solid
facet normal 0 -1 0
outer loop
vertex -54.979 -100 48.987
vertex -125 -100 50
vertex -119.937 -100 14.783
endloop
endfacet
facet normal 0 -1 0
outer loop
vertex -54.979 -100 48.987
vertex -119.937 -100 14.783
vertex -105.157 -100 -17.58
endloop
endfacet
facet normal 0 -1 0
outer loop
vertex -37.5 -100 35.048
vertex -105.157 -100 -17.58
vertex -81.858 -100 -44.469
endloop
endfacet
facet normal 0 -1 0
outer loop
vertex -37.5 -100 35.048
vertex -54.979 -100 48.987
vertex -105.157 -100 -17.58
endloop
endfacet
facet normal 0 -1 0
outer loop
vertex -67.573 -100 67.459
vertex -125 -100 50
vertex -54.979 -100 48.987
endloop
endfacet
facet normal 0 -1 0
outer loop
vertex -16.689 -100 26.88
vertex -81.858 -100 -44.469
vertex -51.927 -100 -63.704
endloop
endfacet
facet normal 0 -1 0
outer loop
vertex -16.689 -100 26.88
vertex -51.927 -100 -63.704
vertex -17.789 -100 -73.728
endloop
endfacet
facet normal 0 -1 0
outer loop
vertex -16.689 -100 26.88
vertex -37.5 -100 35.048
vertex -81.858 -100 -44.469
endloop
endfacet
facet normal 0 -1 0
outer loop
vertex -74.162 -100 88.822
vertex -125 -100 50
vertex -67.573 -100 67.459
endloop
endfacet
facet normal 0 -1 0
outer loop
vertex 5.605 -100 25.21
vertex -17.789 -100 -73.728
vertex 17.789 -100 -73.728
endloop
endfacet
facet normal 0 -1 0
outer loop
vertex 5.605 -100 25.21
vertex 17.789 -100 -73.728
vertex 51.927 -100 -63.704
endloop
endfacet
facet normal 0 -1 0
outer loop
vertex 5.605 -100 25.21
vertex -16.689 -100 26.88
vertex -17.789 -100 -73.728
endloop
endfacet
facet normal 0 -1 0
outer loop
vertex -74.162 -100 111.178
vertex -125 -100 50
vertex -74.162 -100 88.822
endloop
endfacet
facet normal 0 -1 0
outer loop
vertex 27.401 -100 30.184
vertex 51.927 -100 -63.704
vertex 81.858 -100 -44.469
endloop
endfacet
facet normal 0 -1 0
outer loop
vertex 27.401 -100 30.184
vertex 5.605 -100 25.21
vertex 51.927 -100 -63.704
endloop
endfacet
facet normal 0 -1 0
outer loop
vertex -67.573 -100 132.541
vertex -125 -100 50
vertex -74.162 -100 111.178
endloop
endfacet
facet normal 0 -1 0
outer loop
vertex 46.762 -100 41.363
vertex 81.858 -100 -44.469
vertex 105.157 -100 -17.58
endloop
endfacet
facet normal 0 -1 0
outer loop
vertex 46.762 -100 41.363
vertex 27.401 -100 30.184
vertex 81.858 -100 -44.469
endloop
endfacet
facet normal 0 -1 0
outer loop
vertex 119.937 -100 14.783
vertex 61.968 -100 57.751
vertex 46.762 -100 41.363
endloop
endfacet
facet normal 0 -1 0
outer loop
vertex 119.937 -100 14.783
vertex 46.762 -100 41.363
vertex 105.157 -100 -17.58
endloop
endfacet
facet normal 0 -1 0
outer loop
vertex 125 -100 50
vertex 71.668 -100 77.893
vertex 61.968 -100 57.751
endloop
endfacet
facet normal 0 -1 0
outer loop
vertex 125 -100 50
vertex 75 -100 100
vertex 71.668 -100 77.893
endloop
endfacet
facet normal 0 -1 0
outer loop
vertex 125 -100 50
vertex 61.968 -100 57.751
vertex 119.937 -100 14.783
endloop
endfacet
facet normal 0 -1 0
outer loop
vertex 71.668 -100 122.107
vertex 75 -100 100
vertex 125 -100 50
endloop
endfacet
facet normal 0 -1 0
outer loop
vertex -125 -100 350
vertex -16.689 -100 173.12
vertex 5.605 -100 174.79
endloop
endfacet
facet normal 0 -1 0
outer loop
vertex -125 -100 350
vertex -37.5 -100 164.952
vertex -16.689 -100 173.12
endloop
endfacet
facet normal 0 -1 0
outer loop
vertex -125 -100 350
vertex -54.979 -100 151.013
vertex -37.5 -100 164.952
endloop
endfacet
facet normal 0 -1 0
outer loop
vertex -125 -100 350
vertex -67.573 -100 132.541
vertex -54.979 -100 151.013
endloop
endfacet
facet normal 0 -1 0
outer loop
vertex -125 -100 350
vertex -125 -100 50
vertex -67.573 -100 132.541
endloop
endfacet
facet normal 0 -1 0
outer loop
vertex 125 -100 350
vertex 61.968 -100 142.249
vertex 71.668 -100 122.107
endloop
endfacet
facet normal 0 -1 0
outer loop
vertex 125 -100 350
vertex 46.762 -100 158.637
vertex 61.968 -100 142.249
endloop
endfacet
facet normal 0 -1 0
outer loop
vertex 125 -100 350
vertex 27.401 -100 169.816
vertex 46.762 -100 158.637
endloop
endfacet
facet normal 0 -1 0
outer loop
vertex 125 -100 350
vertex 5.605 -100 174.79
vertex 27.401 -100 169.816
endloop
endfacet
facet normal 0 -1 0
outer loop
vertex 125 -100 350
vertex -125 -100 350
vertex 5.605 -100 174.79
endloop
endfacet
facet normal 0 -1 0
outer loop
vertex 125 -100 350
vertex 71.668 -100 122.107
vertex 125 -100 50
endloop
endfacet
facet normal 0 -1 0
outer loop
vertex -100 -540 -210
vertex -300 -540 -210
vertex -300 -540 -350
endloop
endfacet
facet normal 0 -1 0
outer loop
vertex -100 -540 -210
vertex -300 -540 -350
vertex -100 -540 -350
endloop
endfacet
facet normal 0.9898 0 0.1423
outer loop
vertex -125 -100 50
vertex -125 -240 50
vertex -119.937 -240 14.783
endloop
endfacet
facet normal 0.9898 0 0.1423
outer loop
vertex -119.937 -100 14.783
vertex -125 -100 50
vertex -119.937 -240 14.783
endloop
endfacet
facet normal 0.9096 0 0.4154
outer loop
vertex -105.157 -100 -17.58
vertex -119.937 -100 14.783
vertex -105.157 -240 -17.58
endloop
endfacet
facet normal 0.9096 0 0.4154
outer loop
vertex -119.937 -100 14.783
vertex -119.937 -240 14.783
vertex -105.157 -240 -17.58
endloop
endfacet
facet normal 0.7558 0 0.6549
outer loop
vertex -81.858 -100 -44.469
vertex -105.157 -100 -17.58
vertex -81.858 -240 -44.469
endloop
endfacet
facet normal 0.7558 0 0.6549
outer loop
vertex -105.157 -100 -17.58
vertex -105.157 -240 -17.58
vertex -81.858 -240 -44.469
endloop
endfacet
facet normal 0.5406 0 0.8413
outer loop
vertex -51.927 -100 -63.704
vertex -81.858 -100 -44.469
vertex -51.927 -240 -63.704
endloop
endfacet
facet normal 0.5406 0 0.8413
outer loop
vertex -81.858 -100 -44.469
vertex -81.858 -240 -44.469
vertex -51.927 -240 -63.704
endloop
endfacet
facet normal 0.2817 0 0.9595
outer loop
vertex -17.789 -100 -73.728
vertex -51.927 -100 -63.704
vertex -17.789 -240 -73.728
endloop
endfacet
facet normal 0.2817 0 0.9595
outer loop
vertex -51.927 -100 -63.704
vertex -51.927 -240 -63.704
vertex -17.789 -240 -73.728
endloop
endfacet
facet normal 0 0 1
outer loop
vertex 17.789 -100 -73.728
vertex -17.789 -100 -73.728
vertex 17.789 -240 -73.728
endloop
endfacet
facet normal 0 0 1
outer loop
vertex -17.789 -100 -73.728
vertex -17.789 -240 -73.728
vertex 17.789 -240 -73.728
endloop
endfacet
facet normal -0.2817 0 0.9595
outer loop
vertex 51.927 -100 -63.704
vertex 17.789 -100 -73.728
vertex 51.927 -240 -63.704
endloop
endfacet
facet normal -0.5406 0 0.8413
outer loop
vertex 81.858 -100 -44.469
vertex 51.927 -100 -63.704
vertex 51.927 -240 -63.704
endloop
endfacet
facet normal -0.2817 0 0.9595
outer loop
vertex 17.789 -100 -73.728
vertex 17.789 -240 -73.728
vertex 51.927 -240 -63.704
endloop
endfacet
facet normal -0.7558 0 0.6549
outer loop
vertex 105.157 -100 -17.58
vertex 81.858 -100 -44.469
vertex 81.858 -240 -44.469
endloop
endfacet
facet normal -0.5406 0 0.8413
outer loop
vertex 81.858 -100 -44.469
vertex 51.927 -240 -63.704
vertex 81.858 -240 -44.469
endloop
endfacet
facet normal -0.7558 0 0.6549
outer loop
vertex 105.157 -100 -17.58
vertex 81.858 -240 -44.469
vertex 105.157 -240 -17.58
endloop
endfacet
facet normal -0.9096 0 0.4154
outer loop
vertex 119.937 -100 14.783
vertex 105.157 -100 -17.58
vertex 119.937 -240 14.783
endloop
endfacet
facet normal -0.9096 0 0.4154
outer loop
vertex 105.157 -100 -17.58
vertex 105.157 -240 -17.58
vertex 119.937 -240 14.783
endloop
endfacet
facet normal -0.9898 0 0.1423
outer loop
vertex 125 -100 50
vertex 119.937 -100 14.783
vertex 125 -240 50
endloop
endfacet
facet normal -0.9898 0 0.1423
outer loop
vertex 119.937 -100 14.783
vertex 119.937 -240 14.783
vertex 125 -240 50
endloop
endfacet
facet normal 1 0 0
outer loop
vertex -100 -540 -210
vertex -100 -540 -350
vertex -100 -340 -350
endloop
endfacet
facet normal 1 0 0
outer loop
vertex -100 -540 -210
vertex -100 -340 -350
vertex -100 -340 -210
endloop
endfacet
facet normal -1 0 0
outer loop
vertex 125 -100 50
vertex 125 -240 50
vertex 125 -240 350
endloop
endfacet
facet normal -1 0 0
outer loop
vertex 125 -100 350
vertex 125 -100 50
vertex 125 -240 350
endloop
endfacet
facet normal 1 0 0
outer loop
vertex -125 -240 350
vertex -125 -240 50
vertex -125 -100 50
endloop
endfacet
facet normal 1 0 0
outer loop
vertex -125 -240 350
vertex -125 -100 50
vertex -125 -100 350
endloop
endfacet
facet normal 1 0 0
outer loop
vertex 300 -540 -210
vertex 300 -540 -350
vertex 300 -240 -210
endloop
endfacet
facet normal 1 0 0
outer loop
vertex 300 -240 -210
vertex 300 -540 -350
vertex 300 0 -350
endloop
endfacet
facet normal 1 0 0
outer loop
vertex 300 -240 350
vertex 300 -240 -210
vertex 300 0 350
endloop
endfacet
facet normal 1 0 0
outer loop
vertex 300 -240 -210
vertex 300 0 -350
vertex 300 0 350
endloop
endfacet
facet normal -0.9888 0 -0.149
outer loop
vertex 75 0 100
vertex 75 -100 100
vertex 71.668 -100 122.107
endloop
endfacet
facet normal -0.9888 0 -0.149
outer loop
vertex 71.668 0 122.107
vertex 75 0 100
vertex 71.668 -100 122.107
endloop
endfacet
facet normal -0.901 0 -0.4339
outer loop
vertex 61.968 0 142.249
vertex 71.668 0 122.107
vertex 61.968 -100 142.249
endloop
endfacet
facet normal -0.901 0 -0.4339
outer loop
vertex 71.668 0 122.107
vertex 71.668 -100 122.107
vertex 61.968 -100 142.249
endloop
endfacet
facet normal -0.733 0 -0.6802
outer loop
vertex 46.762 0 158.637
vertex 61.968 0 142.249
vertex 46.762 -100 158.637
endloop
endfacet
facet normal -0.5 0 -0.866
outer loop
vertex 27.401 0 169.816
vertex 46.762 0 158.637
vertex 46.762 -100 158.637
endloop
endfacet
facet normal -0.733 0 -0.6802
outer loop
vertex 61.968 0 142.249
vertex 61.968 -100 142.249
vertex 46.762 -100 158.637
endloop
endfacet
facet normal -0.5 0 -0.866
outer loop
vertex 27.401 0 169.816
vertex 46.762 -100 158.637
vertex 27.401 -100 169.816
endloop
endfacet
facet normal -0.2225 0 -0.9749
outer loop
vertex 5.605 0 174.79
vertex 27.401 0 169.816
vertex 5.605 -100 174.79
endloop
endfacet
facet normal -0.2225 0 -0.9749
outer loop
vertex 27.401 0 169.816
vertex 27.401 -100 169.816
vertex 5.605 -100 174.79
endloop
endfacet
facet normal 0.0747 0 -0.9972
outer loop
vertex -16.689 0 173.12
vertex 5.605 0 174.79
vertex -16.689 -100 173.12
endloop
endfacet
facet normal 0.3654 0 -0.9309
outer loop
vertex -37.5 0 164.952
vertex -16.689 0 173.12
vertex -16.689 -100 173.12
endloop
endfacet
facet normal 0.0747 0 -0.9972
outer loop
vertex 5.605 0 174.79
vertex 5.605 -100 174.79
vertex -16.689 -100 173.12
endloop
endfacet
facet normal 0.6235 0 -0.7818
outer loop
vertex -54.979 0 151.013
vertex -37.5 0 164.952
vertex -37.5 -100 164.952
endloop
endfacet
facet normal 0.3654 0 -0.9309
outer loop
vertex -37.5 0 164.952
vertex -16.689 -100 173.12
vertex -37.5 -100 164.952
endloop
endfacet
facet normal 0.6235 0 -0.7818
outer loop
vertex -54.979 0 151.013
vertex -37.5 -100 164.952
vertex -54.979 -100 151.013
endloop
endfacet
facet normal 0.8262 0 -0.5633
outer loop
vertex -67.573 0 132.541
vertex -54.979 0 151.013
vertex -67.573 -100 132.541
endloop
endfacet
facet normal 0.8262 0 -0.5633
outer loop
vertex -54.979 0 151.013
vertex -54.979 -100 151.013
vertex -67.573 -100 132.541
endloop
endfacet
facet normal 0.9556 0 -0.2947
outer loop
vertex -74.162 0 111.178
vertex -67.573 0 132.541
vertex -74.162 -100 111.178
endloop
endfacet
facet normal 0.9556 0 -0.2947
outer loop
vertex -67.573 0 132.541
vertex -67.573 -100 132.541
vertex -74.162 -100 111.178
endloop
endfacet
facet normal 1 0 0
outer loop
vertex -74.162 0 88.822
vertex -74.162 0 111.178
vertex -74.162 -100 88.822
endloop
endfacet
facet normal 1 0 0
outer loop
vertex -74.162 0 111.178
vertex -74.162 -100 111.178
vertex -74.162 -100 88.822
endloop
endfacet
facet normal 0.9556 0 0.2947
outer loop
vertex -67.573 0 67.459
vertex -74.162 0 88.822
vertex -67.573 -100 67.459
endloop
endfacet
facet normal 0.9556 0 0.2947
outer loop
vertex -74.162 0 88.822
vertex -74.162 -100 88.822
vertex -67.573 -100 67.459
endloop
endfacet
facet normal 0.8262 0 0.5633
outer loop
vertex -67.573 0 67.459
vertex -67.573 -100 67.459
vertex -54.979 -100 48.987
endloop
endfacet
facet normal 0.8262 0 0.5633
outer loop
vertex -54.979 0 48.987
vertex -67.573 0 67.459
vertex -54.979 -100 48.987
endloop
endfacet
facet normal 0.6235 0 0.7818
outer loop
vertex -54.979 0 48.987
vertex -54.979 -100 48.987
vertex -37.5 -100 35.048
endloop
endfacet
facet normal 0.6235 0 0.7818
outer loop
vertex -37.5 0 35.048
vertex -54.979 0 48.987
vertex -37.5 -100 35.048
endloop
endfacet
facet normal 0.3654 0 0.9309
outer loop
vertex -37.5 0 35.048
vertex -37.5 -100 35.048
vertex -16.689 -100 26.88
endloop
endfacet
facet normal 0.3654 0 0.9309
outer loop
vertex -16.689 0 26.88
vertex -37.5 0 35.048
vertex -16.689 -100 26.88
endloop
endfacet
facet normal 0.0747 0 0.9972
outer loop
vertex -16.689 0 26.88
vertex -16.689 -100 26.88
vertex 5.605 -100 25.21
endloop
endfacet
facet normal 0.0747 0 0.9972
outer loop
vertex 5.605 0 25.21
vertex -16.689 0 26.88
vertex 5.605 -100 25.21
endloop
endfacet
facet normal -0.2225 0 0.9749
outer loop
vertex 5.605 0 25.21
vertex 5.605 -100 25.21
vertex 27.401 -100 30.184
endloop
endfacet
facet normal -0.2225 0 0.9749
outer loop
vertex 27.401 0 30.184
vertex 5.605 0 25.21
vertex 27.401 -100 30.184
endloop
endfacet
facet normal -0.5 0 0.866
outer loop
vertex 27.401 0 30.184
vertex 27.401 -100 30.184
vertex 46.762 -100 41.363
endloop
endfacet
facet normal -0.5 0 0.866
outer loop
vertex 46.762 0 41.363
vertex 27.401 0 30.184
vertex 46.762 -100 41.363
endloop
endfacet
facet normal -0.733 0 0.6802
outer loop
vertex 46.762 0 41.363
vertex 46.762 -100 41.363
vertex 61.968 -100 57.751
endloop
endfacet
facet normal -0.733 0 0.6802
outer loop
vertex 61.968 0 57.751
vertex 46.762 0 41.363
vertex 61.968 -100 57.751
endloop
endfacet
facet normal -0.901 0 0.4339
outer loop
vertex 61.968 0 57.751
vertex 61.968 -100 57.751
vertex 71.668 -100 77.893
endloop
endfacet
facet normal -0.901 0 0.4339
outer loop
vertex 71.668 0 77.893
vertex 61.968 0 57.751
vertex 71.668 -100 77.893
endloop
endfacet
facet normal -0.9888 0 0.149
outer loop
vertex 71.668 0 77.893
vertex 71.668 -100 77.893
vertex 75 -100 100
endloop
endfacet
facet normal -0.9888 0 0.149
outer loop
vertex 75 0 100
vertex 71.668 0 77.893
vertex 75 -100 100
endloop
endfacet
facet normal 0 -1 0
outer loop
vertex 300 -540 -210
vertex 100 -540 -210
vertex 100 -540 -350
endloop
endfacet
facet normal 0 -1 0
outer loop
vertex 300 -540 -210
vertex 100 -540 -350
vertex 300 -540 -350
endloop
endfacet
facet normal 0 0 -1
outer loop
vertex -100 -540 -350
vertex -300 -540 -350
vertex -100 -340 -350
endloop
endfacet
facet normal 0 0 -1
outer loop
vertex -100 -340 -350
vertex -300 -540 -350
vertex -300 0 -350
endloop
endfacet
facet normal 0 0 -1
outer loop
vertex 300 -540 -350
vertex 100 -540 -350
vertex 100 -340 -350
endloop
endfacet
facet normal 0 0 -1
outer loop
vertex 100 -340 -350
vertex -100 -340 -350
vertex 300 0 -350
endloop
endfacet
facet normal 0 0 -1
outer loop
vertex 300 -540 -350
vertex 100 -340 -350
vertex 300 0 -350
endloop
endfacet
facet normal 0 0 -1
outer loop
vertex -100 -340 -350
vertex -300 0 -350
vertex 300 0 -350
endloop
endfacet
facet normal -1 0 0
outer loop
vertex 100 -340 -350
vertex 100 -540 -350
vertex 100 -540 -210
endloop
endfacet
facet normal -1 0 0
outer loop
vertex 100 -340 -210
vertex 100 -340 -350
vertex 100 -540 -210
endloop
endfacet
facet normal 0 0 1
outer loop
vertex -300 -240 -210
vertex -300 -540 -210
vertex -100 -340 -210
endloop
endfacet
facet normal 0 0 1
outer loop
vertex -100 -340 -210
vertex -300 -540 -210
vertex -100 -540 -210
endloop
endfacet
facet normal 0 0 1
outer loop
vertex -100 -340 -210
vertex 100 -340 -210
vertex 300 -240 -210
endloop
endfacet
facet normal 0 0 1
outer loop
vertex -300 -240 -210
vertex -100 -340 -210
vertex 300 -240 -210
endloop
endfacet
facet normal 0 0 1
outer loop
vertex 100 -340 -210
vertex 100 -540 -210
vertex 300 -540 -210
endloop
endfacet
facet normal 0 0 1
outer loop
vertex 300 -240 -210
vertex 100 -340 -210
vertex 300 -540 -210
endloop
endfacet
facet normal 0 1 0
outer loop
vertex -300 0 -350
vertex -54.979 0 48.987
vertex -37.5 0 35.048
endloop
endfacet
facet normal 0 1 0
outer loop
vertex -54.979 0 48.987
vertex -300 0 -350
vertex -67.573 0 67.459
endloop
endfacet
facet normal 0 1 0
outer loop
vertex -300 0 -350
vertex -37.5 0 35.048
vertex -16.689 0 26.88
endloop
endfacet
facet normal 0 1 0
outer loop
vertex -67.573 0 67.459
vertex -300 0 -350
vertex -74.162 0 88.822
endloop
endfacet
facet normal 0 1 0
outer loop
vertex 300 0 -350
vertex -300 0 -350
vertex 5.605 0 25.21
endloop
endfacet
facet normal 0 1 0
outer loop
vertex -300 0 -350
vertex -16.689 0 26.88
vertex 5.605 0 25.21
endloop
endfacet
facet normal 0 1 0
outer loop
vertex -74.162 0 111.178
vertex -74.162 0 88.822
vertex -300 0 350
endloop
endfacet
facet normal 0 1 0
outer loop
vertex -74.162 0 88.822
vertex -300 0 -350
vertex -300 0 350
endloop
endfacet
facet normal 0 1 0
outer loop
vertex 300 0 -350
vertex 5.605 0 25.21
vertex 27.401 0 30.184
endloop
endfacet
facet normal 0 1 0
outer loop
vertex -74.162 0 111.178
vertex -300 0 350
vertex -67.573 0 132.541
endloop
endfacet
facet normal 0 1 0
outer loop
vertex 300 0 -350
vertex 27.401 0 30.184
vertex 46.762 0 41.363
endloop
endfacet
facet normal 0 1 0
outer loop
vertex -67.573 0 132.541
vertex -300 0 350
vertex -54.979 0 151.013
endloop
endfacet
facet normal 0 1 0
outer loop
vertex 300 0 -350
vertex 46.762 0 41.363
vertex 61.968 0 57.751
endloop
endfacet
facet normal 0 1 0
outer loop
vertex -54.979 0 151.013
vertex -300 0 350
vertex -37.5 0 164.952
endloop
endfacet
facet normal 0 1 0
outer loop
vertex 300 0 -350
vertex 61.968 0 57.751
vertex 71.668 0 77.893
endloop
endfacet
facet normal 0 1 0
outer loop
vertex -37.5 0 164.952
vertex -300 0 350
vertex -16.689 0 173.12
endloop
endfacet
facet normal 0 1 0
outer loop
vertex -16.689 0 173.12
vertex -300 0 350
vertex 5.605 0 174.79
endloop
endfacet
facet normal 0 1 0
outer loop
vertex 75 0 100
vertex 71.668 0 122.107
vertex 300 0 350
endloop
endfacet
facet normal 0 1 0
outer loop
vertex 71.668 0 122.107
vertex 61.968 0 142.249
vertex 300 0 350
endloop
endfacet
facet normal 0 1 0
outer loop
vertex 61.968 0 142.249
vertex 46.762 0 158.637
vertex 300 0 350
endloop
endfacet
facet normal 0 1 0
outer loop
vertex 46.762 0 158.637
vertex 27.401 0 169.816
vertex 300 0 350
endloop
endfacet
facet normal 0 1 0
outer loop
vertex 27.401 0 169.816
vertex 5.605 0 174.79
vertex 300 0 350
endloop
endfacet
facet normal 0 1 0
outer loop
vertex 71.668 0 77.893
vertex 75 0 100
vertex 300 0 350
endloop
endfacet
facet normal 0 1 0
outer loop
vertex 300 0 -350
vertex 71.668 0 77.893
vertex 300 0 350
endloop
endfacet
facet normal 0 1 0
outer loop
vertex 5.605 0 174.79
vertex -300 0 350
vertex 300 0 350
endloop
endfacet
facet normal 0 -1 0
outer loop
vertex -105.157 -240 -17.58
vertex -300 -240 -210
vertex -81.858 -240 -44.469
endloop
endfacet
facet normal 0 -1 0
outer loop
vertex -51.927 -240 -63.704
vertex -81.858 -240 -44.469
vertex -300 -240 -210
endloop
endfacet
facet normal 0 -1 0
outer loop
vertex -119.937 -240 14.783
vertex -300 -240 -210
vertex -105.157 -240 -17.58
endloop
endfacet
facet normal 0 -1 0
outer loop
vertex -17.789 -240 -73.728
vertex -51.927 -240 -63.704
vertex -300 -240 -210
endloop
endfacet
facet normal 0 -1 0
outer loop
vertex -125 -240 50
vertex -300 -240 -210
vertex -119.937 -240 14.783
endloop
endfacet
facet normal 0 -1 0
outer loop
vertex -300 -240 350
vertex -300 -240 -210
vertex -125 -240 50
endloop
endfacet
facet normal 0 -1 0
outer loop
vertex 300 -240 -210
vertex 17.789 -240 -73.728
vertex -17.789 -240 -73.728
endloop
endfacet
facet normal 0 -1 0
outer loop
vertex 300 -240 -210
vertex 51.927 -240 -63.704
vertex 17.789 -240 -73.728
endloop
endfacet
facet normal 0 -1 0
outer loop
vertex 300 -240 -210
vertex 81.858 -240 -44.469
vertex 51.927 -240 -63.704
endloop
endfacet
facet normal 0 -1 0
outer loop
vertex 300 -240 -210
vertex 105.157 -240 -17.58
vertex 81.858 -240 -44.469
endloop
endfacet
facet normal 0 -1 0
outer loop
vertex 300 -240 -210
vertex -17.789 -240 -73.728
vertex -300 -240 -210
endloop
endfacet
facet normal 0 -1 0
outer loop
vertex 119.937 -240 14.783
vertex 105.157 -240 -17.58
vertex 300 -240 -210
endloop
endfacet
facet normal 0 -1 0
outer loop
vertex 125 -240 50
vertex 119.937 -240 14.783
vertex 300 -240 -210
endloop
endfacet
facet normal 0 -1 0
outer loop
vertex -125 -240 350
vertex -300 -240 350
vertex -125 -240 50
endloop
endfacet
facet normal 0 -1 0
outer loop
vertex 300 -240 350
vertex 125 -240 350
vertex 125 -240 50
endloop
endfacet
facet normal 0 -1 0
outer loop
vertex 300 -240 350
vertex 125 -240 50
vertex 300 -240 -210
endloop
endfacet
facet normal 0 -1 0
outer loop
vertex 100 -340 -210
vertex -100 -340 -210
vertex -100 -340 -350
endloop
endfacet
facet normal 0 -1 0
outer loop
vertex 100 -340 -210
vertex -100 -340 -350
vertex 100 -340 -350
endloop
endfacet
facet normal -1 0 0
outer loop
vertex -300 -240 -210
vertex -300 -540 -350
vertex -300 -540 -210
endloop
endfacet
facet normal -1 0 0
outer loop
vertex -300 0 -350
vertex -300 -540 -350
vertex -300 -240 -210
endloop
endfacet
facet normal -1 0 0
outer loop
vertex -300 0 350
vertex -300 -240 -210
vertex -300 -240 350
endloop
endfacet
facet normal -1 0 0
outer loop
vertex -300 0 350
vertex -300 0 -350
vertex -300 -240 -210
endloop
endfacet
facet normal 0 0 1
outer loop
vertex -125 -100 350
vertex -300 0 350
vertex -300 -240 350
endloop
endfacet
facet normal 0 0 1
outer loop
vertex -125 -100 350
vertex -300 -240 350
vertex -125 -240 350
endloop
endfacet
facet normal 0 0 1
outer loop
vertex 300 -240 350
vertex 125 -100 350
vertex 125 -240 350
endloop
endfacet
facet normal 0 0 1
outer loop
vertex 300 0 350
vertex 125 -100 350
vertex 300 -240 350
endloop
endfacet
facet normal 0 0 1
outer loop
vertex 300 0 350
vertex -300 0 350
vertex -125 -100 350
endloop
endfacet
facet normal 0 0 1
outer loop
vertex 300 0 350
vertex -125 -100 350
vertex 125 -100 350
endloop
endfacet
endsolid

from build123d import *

# Parameters (mm, degrees)
F0_W     = 600
F0_H     = 700
F1_DEPTH = 540
F2_W     = 600
F2_H     = 560
F3_DEPTH = 300
F4_W     = 200
F4_H     = 140
F5_DEPTH = 200
F6_W     = 250
F6_H     = 600
F7_DEPTH = 140
F8_R     = 75
F9_DEPTH = 100.001


with BuildPart() as f1:
    # F0 (on Front) → F1 (new body)
    with BuildSketch(Plane.XZ):
        Rectangle(F0_W, F0_H)
    extrude(amount=F1_DEPTH)

    # F2 (on face) → F3 (cut)
    with BuildSketch(Plane.XZ.offset(540)):
        with Locations((0, 70)):
            Rectangle(F2_W, F2_H)
    extrude(amount=-F3_DEPTH, mode=Mode.SUBTRACT)

    # F4 (on face) → F5 (cut)
    with BuildSketch(Plane.XZ.offset(540)):
        with Locations((0, -280)):
            Rectangle(F4_W, F4_H)
    extrude(amount=-F5_DEPTH, mode=Mode.SUBTRACT)

    # F6 (on face) → F7 (cut)
    with BuildSketch(Plane.XZ.offset(240)):
        with BuildLine():
            ThreePointArc((-125, 50), (0, -75), (125, 50))
            Line((125, 50), (-125, 50))
        make_face()
        with Locations((0, 350)):
            Rectangle(F6_W, F6_H)
    extrude(amount=-F7_DEPTH, mode=Mode.SUBTRACT)

    # F8 (on face) → F9 (cut, through all)
    with BuildSketch(Plane.XZ.offset(100)):
        with Locations((0, 100)):
            Circle(F8_R)
    extrude(amount=-F9_DEPTH, mode=Mode.SUBTRACT)


solid = f1.part
